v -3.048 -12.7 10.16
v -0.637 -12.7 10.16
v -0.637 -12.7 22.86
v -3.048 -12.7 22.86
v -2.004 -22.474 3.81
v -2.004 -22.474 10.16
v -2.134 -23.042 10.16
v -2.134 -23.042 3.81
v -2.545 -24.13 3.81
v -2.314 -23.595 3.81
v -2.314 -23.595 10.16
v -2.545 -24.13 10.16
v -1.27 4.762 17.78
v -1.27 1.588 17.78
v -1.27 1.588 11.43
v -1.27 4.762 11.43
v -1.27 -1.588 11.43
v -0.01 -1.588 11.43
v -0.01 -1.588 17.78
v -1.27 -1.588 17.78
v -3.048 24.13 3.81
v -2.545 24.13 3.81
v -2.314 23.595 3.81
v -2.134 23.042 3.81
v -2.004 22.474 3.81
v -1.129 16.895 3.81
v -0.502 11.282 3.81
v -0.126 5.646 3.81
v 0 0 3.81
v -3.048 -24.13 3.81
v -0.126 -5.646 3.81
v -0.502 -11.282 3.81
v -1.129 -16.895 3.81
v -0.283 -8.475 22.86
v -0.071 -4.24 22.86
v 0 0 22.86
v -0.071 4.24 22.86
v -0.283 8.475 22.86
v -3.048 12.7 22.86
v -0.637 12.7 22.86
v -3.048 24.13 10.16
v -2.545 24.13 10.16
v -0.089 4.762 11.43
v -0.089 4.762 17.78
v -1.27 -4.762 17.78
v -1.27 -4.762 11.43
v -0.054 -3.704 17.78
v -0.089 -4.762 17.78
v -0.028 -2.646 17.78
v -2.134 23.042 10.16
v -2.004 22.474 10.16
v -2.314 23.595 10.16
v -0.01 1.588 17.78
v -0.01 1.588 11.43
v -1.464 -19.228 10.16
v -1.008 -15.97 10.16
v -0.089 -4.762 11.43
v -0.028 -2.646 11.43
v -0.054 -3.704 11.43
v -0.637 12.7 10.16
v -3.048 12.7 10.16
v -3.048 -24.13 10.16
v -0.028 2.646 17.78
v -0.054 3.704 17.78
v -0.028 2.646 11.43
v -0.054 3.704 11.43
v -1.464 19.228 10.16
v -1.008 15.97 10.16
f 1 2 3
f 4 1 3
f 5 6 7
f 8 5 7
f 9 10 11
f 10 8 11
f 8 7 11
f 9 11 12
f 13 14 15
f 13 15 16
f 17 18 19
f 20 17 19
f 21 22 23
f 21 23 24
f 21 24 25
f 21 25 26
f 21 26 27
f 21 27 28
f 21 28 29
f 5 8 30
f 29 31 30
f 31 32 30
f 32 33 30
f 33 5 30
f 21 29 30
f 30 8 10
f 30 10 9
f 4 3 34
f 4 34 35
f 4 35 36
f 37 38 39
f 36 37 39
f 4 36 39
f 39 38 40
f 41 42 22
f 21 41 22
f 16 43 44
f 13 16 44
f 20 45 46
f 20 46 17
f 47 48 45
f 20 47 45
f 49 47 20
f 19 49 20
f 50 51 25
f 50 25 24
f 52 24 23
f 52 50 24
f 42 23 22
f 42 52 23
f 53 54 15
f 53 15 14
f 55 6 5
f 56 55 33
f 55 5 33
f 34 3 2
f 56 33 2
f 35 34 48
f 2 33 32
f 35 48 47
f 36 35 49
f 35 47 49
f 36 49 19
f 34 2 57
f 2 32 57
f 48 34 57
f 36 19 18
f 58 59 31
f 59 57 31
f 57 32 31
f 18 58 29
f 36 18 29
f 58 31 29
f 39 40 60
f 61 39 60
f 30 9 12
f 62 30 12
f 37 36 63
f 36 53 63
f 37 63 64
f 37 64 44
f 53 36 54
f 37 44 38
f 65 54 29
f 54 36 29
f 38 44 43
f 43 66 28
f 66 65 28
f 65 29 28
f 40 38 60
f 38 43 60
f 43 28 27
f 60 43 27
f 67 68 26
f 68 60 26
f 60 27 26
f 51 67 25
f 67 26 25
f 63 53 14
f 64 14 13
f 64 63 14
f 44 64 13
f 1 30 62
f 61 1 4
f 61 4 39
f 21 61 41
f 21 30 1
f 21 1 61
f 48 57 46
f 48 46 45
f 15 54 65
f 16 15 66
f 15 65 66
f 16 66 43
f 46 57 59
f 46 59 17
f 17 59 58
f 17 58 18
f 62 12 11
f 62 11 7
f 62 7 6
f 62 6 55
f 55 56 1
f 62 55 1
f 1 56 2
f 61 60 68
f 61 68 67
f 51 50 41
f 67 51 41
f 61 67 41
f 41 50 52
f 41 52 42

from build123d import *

# Parameters (mm, degrees)
F1_DEPTH = 25.4
F2_R     = 6.35
F3_W     = 65.815818
F3_H     = 34.738873
F4_DEPTH = 15.774595
F5_W     = 13.649403
F5_H     = 52.52206
F6_DEPTH = 22.861
F7_W     = 3.175
F7_H     = 6.35
F8_DEPTH = 1.27


with BuildPart() as f1:
    # F0 (on Top) → F1 (new body)
    with BuildSketch(Plane.XY):
        with BuildLine():
            Line((-3.073595, 27.77132), (-3.073595, -27.77132))
            ThreePointArc((-3.073595, -27.77132), (-0.770738, -13.970444), (0, 0))
            ThreePointArc((0, 0), (-0.770738, 13.970444), (-3.073595, 27.77132))
        make_face()
        Polygon((-15.773595, -27.599099), (-3.073595, -27.77132), (-3.073595, 27.77132), (-15.773595, 27.599099), align=None)
    extrude(amount=F1_DEPTH)

    # F2
    f2_edges = [f1.edges().sort_by_distance(p)[0] for p in [
        (-3.073595, 27.77132, 12.7),
        (-3.073595, -27.77132, 12.7),
    ]]
    fillet(f2_edges, radius=F2_R)

    # F3 (on Right) → F4 (cut, through all)
    with BuildSketch(Plane.YZ):
        with Locations((2.774937, 10.382003)):
            Rectangle(F3_W, F3_H)
        Polygon((-12.7, 10.16), (-12.7, 22.86), (12.7, 22.86), (12.7, 10.16), (24.13, 10.16), (24.13, 3.81), (-24.13, 3.81), (-24.13, 10.16), align=None, mode=Mode.SUBTRACT)
    extrude(amount=-F4_DEPTH, mode=Mode.SUBTRACT)

    # F5 (on Top) → F6 (cut, through all)
    with BuildSketch(Plane.XY):
        with Locations((-9.872701, -0.828976)):
            Rectangle(F5_W, F5_H)
    extrude(amount=F6_DEPTH, mode=Mode.SUBTRACT)

    # F7 (on Right) → F8 (cut)
    with BuildSketch(Plane.YZ):
        with Locations((-3.175, 14.605)):
            Rectangle(F7_W, F7_H)
        with Locations((3.175, 14.605)):
            Rectangle(F7_W, F7_H)
    extrude(amount=-F8_DEPTH, mode=Mode.SUBTRACT)


solid = f1.part
